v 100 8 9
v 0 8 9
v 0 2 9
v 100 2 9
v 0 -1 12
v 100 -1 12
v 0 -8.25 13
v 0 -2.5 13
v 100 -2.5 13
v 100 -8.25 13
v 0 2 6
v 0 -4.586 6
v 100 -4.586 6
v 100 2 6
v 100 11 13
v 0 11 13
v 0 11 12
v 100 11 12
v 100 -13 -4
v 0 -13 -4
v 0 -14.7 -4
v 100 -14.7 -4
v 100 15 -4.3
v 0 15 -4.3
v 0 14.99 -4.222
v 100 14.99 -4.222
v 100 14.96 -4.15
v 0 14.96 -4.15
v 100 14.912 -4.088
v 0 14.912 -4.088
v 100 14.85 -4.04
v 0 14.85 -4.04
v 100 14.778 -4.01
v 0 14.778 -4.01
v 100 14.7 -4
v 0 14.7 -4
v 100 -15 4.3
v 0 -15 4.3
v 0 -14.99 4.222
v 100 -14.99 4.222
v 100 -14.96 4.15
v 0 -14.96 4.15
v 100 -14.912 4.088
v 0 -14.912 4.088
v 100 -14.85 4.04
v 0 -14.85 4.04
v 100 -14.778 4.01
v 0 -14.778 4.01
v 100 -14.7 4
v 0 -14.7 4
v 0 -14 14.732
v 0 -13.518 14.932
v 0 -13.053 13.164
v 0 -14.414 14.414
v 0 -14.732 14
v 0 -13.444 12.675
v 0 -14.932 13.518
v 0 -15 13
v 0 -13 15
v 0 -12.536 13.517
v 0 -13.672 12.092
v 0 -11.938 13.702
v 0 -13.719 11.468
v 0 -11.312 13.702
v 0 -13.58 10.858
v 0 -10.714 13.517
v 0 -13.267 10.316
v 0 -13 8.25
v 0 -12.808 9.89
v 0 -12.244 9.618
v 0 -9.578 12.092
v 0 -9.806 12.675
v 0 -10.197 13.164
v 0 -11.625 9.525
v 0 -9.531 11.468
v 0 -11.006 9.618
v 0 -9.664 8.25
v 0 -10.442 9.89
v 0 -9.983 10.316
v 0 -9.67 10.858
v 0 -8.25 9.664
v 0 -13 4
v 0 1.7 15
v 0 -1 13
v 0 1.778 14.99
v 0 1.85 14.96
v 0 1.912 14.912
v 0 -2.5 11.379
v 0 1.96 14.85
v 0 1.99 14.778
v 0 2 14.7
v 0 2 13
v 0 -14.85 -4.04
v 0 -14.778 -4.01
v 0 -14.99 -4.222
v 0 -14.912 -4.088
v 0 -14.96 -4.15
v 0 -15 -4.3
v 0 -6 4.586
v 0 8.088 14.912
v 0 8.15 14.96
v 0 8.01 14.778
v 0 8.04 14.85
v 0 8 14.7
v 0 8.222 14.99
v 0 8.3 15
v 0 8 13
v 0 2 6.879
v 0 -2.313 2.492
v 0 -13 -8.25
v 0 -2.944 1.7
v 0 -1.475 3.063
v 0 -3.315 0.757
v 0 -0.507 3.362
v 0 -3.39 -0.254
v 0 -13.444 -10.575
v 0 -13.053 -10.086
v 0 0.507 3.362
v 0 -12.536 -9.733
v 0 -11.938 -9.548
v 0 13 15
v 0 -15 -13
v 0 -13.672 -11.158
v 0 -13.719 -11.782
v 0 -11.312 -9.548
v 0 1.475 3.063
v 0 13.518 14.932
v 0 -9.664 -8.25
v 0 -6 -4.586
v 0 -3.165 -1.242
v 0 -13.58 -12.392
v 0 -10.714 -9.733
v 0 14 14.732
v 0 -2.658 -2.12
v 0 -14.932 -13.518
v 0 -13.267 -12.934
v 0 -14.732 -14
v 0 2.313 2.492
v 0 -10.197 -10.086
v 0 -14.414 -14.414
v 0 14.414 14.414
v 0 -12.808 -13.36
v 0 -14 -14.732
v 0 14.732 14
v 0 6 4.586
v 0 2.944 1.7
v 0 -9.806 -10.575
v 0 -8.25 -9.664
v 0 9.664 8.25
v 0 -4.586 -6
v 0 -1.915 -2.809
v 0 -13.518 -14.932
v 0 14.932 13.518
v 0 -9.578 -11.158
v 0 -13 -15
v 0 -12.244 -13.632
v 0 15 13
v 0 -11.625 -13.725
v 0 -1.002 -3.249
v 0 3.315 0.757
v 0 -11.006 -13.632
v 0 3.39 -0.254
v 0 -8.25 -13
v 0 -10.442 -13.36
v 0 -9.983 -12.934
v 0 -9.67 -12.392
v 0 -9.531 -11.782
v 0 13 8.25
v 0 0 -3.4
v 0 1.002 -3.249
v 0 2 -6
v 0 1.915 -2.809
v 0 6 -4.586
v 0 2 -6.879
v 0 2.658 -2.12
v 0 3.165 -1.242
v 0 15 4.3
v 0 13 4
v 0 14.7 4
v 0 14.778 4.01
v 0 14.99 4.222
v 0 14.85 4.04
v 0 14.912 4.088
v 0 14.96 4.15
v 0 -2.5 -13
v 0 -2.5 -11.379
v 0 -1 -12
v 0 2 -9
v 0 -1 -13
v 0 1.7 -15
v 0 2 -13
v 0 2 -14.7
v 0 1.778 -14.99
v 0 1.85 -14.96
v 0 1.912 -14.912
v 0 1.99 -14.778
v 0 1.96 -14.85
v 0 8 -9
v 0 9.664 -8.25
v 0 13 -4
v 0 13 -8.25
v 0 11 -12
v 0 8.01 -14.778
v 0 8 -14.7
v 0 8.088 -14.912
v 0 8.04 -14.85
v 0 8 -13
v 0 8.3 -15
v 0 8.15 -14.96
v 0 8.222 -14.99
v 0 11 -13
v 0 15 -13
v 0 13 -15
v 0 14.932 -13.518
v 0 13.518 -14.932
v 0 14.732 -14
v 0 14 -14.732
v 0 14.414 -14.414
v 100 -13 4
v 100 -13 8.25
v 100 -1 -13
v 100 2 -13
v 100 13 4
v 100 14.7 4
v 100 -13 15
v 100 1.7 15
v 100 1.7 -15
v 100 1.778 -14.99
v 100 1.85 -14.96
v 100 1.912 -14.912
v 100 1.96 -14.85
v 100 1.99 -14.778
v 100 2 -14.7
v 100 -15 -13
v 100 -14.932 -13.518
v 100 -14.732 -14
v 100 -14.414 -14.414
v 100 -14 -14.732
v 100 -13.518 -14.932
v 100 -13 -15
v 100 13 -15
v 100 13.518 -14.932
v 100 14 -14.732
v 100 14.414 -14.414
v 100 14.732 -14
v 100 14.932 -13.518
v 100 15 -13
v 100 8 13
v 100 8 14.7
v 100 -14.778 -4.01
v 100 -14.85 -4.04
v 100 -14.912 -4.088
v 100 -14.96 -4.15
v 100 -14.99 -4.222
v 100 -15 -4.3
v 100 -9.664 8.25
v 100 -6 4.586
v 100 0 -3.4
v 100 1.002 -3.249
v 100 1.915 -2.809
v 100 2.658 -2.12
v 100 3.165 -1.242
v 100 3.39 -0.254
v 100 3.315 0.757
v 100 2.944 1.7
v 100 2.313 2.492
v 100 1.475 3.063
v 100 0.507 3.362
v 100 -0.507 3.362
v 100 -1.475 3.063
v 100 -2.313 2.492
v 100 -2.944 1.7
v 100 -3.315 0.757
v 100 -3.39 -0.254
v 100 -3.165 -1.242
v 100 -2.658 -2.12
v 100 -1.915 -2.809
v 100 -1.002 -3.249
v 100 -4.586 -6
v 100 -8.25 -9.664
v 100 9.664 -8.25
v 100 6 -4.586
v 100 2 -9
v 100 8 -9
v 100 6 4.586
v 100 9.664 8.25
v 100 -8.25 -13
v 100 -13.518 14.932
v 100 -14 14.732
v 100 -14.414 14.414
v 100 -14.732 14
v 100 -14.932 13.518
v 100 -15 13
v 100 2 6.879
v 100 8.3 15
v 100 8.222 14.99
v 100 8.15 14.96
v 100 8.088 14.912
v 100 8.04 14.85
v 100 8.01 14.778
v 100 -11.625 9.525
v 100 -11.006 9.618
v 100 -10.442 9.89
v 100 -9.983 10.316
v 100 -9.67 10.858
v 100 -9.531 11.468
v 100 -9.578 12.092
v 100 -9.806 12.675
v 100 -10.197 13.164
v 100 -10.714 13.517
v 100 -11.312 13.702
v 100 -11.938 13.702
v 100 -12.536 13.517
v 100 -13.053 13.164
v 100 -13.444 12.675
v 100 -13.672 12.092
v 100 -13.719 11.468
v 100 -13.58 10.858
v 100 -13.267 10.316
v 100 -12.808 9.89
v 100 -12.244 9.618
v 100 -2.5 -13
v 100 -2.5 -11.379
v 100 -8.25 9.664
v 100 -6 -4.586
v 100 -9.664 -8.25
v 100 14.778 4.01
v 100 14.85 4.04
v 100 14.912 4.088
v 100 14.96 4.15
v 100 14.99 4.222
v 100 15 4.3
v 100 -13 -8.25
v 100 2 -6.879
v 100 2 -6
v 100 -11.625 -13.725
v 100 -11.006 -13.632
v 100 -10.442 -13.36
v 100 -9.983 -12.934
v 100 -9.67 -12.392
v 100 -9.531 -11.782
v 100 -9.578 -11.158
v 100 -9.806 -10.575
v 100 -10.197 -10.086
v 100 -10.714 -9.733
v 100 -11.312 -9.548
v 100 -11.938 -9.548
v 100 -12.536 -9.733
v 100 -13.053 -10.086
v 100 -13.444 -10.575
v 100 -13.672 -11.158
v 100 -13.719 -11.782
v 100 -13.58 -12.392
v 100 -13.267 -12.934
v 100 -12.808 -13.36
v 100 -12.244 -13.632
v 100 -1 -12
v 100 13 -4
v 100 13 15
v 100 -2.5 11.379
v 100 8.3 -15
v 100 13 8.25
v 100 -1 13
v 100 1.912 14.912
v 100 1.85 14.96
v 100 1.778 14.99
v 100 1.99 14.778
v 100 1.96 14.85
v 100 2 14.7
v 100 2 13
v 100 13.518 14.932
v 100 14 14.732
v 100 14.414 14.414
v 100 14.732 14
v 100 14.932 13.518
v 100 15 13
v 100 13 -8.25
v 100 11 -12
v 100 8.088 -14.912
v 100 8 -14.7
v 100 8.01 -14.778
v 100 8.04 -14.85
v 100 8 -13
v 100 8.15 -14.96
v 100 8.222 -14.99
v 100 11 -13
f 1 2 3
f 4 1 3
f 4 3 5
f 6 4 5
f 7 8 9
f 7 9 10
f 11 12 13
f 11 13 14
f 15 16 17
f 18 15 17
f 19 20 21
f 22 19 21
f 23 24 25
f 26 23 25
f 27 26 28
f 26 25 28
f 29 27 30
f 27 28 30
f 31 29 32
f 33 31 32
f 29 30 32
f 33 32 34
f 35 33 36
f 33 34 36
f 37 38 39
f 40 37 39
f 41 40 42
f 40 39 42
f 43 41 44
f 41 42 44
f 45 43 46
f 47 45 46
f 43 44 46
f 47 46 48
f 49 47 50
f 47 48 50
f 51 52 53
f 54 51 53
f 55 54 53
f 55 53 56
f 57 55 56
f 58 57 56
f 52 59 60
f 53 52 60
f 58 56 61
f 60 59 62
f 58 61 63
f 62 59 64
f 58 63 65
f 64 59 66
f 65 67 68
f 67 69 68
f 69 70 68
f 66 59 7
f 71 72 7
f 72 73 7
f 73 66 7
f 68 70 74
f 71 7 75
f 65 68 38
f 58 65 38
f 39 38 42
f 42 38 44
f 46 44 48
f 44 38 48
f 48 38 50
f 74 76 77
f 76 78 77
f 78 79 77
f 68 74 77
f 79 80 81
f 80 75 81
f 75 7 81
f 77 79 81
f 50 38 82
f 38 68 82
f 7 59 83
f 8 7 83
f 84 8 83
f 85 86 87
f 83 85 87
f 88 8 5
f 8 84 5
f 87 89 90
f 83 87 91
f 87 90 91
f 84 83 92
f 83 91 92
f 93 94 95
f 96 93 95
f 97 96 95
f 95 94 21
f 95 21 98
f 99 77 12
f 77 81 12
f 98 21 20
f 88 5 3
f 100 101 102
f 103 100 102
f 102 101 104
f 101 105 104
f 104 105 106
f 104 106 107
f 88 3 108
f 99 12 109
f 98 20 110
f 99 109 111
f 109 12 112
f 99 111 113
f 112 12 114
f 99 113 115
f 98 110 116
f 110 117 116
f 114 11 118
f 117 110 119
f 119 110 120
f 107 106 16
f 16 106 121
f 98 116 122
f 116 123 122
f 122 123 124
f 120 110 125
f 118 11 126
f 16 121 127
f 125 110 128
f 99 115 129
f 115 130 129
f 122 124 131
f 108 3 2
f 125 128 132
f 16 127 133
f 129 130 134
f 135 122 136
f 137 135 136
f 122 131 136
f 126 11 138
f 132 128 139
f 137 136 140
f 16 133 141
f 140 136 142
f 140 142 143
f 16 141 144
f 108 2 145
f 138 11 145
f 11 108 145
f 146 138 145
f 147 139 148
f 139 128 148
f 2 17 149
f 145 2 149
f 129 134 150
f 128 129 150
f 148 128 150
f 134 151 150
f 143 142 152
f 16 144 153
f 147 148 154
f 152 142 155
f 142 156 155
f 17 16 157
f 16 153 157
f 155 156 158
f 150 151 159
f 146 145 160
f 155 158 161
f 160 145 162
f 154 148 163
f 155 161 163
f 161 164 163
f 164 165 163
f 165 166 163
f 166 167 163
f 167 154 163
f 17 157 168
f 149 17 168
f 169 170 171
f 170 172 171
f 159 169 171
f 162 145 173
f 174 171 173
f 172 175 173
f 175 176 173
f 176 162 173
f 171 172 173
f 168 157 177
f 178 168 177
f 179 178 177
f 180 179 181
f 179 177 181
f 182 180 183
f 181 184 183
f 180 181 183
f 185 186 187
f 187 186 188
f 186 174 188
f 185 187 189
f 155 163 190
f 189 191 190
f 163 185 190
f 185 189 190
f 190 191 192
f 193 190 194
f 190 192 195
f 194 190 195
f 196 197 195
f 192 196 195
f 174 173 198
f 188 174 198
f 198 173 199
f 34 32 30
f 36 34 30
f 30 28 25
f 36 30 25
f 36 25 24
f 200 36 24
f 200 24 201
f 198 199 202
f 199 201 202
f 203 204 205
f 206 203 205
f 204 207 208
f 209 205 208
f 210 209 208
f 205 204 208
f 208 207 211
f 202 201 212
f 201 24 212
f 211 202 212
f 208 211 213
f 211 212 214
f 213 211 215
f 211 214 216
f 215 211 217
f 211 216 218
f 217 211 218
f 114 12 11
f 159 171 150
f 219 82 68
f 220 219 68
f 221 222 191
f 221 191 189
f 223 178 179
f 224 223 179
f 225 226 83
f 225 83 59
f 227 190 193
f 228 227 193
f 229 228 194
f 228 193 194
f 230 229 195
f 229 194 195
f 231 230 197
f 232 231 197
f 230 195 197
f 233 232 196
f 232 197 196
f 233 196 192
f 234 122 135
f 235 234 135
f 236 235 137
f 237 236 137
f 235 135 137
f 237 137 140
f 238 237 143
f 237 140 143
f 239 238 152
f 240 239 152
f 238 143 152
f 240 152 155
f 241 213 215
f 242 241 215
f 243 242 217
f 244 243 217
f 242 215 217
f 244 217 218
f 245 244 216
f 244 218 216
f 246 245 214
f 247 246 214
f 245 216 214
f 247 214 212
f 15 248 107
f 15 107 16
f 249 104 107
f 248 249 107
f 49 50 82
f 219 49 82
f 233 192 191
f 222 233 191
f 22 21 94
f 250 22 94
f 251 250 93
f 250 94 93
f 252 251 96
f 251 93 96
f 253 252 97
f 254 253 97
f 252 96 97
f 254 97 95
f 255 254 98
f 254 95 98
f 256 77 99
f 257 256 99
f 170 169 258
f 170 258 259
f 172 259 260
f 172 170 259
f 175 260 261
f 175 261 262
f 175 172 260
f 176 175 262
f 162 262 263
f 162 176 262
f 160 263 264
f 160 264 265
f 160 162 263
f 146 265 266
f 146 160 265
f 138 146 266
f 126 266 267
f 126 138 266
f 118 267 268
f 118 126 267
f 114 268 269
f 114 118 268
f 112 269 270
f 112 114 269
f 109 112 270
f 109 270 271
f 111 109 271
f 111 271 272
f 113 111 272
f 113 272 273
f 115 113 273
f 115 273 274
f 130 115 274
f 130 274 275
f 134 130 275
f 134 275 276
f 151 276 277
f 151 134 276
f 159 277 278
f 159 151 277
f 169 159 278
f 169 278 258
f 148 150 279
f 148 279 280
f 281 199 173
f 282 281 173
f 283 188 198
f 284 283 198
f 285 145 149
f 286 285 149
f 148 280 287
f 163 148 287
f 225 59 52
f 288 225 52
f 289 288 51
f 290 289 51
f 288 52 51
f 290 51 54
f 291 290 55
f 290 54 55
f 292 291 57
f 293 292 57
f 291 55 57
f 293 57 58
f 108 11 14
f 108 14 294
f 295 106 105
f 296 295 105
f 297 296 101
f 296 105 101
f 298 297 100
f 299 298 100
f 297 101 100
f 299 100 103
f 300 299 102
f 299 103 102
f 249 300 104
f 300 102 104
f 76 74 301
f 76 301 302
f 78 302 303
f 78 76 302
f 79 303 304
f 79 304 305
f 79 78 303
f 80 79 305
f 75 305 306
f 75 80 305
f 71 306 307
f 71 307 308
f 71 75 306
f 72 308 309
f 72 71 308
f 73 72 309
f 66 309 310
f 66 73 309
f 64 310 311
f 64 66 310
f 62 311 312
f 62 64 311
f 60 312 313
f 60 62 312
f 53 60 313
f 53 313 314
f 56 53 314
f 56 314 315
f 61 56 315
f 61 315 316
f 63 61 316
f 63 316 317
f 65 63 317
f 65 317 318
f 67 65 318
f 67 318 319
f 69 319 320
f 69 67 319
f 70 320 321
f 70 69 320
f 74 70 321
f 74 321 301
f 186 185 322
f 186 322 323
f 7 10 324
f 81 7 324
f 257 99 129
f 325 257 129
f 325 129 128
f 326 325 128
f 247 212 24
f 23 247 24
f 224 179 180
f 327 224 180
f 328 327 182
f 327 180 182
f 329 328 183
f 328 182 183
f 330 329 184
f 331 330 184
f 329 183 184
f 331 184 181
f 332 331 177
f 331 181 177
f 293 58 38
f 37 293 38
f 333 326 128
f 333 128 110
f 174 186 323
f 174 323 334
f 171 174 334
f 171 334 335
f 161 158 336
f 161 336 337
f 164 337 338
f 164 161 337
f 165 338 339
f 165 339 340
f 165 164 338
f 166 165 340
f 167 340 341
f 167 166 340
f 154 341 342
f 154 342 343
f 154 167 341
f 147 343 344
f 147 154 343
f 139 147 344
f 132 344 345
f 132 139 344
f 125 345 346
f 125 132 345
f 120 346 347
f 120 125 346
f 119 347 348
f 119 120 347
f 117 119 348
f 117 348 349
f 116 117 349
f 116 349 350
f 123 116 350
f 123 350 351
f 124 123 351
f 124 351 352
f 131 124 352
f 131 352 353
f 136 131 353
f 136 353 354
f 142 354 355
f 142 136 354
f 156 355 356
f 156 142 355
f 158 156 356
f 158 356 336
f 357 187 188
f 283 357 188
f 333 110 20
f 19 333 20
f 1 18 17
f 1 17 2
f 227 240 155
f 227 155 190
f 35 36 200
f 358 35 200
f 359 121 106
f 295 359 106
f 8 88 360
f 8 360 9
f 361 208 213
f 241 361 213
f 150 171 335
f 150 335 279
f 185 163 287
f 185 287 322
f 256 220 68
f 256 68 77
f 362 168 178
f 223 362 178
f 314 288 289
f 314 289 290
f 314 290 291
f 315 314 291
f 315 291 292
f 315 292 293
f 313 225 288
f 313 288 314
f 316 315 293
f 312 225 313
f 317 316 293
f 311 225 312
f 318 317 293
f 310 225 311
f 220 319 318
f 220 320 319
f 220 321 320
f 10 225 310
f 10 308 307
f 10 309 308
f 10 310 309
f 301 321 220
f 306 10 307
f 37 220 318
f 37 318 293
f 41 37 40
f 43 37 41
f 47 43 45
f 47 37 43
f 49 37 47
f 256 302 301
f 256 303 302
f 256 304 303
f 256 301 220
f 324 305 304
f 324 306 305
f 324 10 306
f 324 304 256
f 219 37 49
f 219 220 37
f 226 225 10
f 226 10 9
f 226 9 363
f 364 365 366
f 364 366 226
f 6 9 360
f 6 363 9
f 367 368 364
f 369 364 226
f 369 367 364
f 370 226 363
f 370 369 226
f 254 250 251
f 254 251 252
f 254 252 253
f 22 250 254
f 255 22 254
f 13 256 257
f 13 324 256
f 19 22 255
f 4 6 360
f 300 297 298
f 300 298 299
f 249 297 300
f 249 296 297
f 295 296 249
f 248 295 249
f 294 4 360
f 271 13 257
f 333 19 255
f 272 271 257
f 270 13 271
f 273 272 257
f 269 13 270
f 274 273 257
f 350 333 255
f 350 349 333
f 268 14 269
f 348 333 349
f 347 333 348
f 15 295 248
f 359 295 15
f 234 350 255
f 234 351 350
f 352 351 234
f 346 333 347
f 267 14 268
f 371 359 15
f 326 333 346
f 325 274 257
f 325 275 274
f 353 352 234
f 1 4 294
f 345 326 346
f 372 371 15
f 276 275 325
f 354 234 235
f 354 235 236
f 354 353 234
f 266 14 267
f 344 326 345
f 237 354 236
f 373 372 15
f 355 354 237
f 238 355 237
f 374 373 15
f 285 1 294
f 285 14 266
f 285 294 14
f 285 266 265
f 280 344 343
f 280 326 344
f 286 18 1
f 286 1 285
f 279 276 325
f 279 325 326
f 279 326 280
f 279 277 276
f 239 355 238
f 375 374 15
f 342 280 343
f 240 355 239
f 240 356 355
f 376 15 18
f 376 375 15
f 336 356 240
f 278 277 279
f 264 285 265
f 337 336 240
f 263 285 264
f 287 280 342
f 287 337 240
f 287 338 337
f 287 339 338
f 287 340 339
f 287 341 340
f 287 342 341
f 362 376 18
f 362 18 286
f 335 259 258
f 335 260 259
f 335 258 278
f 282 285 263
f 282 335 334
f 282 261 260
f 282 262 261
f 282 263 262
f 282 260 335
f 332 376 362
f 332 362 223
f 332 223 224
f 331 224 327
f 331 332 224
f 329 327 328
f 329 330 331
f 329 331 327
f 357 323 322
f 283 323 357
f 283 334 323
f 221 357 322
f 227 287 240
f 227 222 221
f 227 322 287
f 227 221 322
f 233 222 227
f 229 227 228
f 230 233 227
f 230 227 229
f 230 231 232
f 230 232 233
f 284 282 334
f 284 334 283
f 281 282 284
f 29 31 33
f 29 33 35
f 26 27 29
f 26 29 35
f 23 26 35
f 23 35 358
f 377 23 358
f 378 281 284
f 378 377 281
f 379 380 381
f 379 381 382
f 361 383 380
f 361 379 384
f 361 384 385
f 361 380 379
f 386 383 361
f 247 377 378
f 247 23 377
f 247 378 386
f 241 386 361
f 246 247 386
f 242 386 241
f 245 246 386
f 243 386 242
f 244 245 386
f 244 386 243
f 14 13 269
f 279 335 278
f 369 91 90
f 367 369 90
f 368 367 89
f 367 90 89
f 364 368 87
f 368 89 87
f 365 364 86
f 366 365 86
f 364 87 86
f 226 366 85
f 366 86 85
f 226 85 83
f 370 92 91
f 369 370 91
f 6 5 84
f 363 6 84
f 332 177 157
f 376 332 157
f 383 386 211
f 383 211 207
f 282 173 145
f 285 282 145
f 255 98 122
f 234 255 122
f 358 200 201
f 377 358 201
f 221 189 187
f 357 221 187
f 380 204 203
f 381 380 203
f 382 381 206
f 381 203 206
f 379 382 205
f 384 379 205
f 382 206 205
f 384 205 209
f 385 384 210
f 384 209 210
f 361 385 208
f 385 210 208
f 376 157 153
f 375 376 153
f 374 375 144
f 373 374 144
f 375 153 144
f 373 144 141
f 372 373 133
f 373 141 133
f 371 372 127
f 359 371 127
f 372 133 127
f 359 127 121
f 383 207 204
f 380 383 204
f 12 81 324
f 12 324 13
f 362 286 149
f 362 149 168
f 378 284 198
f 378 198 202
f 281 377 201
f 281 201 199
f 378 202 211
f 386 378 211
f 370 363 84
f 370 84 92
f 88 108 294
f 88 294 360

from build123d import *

# Parameters (mm, degrees)
SKETCH1_R           = 3.4
SKETCH1_R_2         = 2.1
BOSS_EXTRUDE1_DEPTH = 100


with BuildPart() as part:
    # Sketch1 → Boss-Extrude1 (new body)
    with BuildSketch(Plane(origin=(0, 0, 0), x_dir=(0, 0, -1), z_dir=(1, 0, 0))):
        with BuildLine():
            Line((-15, 1.7), (-15, -13))
            ThreePointArc((-15, -13), (-14.414213562, -14.414213562), (-13, -15))
            Line((-13, -15), (-4.3, -15))
            ThreePointArc((-4.3, -15), (-4.087867966, -14.912132034), (-4, -14.7))
            Line((-4, -14.7), (-4, -13))
            Line((-4, -13), (-8.25, -13))
            Line((-8.25, -13), (-8.25, -9.664213562))
            Line((-8.25, -9.664213562), (-4.585786438, -6))
            Line((-4.585786438, -6), (4.585786438, -6))
            Line((4.585786438, -6), (8.25, -9.664213562))
            Line((8.25, -9.664213562), (8.25, -13))
            Line((8.25, -13), (4, -13))
            Line((4, -13), (4, -14.7))
            ThreePointArc((4, -14.7), (4.087867966, -14.912132034), (4.3, -15))
            Line((4.3, -15), (13, -15))
            ThreePointArc((13, -15), (14.414213562, -14.414213562), (15, -13))
            Line((15, -13), (15, 1.7))
            ThreePointArc((15, 1.7), (14.912132034, 1.912132034), (14.7, 2))
            Line((14.7, 2), (13, 2))
            Line((13, 2), (13, -1))
            Line((13, -1), (12, -1))
            Line((12, -1), (9, 2))
            Line((9, 2), (9, 8))
            Line((9, 8), (12, 11))
            Line((12, 11), (13, 11))
            Line((13, 11), (13, 8))
            Line((13, 8), (14.7, 8))
            ThreePointArc((14.7, 8), (14.912132034, 8.087867966), (15, 8.3))
            Line((15, 8.3), (15, 13))
            ThreePointArc((15, 13), (14.414213562, 14.414213562), (13, 15))
            Line((13, 15), (4.3, 15))
            ThreePointArc((4.3, 15), (4.087867966, 14.912132034), (4, 14.7))
            Line((4, 14.7), (4, 13))
            Line((4, 13), (8.25, 13))
            Line((8.25, 13), (8.25, 9.664213562))
            Line((8.25, 9.664213562), (4.585786438, 6))
            Line((4.585786438, 6), (-4.585786438, 6))
            Line((-4.585786438, 6), (-8.25, 9.664213562))
            Line((-8.25, 9.664213562), (-8.25, 13))
            Line((-8.25, 13), (-4, 13))
            Line((-4, 13), (-4, 14.7))
            ThreePointArc((-4, 14.7), (-4.087867966, 14.912132034), (-4.3, 15))
            Line((-4.3, 15), (-13, 15))
            ThreePointArc((-13, 15), (-14.414213562, 14.414213562), (-15, 13))
            Line((-15, 13), (-15, 8.3))
            ThreePointArc((-15, 8.3), (-14.912132034, 8.087867966), (-14.7, 8))
            Line((-14.7, 8), (-13, 8))
            Line((-13, 8), (-13, 11))
            Line((-13, 11), (-12, 11))
            Line((-12, 11), (-9, 8))
            Line((-9, 8), (-9, 2))
            Line((-9, 2), (-12, -1))
            Line((-12, -1), (-13, -1))
            Line((-13, -1), (-13, 2))
            Line((-13, 2), (-14.7, 2))
            ThreePointArc((-14.7, 2), (-14.912132034, 1.912132034), (-15, 1.7))
        make_face()
        Circle(SKETCH1_R, mode=Mode.SUBTRACT)
        with Locations((-11.625, -11.625)):
            Circle(SKETCH1_R_2, mode=Mode.SUBTRACT)
        with Locations((11.625, -11.625)):
            Circle(SKETCH1_R_2, mode=Mode.SUBTRACT)
        Polygon((-13, -2.5), (-13, -8.25), (-9.664213562, -8.25), (-6, -4.585786438), (-6, 2), (-6.878679656, 2), (-11.378679656, -2.5), align=None, mode=Mode.SUBTRACT)
        Polygon((6, 2), (6, -4.585786438), (9.664213562, -8.25), (13, -8.25), (13, -2.5), (11.378679656, -2.5), (6.878679656, 2), align=None, mode=Mode.SUBTRACT)
    extrude(amount=BOSS_EXTRUDE1_DEPTH)


solid = part.part
